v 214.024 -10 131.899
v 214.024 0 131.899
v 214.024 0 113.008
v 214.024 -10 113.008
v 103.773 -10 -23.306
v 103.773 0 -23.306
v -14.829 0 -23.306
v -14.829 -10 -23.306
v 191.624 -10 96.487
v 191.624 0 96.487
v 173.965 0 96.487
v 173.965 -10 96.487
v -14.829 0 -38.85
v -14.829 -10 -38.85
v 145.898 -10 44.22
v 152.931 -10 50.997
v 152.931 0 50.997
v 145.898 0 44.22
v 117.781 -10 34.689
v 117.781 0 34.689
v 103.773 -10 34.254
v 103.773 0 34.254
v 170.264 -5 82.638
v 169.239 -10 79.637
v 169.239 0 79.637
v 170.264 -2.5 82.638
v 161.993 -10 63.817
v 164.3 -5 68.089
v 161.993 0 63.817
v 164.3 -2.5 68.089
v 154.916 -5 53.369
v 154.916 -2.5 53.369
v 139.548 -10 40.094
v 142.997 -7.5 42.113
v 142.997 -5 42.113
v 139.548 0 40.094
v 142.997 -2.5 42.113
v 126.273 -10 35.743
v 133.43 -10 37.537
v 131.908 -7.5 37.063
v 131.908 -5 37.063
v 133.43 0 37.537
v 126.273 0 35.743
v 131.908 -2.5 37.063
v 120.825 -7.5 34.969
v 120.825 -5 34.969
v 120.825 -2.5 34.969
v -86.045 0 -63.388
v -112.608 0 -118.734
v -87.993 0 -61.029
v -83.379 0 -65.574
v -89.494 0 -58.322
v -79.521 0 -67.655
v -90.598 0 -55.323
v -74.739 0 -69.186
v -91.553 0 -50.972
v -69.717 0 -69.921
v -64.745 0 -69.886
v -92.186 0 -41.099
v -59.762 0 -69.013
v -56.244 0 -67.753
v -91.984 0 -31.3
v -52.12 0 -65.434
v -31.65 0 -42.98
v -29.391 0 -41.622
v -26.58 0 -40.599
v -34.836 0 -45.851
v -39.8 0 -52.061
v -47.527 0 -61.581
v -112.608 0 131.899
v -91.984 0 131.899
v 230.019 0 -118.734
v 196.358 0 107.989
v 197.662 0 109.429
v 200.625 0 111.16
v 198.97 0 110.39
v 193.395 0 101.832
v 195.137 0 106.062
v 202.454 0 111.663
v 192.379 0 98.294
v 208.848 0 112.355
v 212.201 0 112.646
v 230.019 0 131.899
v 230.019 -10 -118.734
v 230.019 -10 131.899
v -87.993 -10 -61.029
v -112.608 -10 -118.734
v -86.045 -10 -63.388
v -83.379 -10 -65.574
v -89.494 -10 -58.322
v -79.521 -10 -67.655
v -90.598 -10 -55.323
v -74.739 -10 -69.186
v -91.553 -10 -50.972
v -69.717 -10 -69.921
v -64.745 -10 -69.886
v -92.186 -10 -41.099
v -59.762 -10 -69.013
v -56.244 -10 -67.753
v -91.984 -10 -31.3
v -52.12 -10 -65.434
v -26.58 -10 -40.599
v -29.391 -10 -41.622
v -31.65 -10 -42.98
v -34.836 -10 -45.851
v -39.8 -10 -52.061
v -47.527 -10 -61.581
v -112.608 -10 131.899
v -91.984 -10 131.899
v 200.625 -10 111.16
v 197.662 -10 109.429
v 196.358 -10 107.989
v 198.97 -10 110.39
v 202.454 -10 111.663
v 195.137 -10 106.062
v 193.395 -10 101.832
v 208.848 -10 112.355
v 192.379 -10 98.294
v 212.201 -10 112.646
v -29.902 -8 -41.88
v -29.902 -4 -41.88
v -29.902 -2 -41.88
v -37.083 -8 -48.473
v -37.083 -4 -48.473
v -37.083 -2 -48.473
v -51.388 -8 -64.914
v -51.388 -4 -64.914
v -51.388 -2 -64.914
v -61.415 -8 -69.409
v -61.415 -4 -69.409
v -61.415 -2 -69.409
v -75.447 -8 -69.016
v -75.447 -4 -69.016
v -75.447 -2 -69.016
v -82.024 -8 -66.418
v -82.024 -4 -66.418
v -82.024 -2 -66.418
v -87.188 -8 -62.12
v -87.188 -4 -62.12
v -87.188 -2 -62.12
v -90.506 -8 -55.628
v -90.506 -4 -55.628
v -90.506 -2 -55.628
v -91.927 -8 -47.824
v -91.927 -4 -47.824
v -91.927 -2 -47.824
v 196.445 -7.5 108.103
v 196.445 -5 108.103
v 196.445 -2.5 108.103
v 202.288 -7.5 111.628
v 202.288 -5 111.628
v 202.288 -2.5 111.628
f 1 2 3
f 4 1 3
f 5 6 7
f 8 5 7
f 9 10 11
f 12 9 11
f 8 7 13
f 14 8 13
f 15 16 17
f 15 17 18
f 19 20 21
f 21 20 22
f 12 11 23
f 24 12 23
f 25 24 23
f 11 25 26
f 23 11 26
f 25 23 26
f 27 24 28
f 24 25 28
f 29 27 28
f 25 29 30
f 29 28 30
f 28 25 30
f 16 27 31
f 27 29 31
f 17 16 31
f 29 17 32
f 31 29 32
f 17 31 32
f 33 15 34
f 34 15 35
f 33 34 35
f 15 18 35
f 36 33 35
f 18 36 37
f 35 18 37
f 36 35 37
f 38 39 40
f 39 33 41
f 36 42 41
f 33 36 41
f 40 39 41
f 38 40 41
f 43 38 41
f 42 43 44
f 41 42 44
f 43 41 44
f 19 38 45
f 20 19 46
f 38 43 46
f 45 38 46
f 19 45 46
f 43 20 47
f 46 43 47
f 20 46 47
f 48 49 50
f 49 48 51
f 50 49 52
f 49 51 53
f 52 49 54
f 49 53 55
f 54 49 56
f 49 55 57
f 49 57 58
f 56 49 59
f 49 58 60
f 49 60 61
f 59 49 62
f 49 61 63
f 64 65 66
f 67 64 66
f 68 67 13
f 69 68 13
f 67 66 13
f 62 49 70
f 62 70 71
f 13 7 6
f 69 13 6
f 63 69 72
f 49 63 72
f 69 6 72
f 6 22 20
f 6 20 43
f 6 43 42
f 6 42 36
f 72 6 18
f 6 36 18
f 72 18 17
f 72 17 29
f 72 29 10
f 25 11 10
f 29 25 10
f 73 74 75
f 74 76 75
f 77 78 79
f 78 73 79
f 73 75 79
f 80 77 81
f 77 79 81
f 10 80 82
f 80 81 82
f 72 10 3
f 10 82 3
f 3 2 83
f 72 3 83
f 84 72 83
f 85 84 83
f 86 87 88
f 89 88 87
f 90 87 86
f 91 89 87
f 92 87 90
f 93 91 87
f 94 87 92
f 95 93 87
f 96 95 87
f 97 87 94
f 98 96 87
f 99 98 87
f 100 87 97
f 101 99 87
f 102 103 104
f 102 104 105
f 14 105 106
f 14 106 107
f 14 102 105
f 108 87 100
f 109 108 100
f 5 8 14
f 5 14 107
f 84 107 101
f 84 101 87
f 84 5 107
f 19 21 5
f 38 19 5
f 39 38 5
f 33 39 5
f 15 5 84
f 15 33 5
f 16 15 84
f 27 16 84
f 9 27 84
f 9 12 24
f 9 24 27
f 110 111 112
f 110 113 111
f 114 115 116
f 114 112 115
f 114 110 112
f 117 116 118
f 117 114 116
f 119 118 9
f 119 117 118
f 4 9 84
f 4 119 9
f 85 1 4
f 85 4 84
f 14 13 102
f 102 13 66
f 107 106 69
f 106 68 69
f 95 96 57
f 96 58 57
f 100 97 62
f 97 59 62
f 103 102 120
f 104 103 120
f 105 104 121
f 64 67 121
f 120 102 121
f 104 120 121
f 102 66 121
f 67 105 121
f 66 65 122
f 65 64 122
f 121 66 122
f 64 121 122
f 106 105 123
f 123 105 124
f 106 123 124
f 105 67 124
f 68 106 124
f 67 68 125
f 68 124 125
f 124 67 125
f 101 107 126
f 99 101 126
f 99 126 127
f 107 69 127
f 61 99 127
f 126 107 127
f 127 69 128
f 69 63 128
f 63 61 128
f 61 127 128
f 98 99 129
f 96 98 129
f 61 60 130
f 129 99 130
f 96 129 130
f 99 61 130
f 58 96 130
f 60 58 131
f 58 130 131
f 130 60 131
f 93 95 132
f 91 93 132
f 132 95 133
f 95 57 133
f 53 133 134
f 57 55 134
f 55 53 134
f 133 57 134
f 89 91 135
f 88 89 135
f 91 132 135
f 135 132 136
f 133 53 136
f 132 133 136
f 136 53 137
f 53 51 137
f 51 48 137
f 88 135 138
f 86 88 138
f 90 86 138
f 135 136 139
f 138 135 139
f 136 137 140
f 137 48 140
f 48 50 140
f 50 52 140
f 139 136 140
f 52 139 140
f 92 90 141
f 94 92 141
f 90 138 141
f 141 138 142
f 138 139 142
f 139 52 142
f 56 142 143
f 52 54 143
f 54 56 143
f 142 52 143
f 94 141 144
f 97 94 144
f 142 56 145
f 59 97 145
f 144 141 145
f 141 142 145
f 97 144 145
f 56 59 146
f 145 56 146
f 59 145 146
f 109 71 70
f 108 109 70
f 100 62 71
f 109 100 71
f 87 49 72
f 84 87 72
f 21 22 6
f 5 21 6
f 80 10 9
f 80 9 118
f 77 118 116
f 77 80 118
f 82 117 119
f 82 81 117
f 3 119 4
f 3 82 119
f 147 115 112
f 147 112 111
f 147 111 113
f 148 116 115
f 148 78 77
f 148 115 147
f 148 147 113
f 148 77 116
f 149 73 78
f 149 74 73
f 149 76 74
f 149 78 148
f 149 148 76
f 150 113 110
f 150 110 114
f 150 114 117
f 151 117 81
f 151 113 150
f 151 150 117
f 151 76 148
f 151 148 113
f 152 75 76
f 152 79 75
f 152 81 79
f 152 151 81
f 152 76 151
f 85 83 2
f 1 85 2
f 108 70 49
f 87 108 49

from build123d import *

# Parameters (mm, degrees)
F2_DEPTH = 10


with BuildPart() as f2:
    # F1 (on face) → F2 (new body)
    with BuildSketch(Plane.XZ):
        with BuildLine():
            Line((-91.9840037823, -31.2996767461), (-91.9840037823, 131.8993419409))
            Line((-91.9840037823, 131.8993419409), (-112.6081570983, 131.8993419409))
            Line((-112.6081570983, 131.8993419409), (-112.6081570983, -118.7344565988))
            Line((-112.6081570983, -118.7344565988), (230.0193011761, -118.7344565988))
            Line((230.0193011761, -118.7344565988), (230.0193011761, 131.8993419409))
            Line((230.0193011761, 131.8993419409), (214.0238434076, 131.8993419409))
            Line((214.0238434076, 131.8993419409), (214.0238434076, 113.0083352327))
            add(Edge.make_bspline(
                [(191.6237324476, 96.4869484305), (192.4980250224, 98.1278702864), (193.1536069546, 101.9439997116), (196.1146778047, 108.6562828707), (201.6165341433, 112.5583739062), (211.8606585251, 112.2793213926), (214.0238434076, 113.0083352327)],
                knots=[0, 0, 0, 0, 0.2157210018, 0.4532431975, 0.6893360054, 1, 1, 1, 1], degree=3))
            Line((191.6237324476, 96.4869484305), (173.9649176598, 96.4869484305))
            add(Edge.make_bspline(
                [(173.9649176598, 96.4869484305), (172.0666621983, 87.7106344295), (166.200808661, 67.3071544762), (145.3206230123, 39.4041475495), (121.2131008193, 34.3114486831), (109.1523088398, 34.3117546192), (103.772804141, 34.2541225255)],
                knots=[0, 0, 0, 0, 0.2707270162, 0.5572229358, 0.7957939194, 1, 1, 1, 1], degree=3))
            Line((103.772804141, 34.2541225255), (103.772804141, -23.3063530177))
            Line((103.772804141, -23.3063530177), (-14.8291196674, -23.3063530177))
            Line((-14.8291196674, -23.3063530177), (-14.8291196674, -38.8501137495))
            add(Edge.make_bspline(
                [(-14.8291196674, -38.8501137495), (-19.5772007963, -39.8984086665), (-31.9000289258, -38.8742055052), (-43.0777025398, -58.4234253449), (-59.6611048278, -73.1198238571), (-94.1107291621, -66.6840596527), (-92.2154498937, -41.7158947129), (-91.9840037823, -31.2996767461)],
                knots=[0, 0, 0, 0, 0.1643265607, 0.3546135647, 0.5490488256, 0.7659434096, 1, 1, 1, 1], degree=3))
        make_face()
    extrude(amount=F2_DEPTH)


solid = f2.part
